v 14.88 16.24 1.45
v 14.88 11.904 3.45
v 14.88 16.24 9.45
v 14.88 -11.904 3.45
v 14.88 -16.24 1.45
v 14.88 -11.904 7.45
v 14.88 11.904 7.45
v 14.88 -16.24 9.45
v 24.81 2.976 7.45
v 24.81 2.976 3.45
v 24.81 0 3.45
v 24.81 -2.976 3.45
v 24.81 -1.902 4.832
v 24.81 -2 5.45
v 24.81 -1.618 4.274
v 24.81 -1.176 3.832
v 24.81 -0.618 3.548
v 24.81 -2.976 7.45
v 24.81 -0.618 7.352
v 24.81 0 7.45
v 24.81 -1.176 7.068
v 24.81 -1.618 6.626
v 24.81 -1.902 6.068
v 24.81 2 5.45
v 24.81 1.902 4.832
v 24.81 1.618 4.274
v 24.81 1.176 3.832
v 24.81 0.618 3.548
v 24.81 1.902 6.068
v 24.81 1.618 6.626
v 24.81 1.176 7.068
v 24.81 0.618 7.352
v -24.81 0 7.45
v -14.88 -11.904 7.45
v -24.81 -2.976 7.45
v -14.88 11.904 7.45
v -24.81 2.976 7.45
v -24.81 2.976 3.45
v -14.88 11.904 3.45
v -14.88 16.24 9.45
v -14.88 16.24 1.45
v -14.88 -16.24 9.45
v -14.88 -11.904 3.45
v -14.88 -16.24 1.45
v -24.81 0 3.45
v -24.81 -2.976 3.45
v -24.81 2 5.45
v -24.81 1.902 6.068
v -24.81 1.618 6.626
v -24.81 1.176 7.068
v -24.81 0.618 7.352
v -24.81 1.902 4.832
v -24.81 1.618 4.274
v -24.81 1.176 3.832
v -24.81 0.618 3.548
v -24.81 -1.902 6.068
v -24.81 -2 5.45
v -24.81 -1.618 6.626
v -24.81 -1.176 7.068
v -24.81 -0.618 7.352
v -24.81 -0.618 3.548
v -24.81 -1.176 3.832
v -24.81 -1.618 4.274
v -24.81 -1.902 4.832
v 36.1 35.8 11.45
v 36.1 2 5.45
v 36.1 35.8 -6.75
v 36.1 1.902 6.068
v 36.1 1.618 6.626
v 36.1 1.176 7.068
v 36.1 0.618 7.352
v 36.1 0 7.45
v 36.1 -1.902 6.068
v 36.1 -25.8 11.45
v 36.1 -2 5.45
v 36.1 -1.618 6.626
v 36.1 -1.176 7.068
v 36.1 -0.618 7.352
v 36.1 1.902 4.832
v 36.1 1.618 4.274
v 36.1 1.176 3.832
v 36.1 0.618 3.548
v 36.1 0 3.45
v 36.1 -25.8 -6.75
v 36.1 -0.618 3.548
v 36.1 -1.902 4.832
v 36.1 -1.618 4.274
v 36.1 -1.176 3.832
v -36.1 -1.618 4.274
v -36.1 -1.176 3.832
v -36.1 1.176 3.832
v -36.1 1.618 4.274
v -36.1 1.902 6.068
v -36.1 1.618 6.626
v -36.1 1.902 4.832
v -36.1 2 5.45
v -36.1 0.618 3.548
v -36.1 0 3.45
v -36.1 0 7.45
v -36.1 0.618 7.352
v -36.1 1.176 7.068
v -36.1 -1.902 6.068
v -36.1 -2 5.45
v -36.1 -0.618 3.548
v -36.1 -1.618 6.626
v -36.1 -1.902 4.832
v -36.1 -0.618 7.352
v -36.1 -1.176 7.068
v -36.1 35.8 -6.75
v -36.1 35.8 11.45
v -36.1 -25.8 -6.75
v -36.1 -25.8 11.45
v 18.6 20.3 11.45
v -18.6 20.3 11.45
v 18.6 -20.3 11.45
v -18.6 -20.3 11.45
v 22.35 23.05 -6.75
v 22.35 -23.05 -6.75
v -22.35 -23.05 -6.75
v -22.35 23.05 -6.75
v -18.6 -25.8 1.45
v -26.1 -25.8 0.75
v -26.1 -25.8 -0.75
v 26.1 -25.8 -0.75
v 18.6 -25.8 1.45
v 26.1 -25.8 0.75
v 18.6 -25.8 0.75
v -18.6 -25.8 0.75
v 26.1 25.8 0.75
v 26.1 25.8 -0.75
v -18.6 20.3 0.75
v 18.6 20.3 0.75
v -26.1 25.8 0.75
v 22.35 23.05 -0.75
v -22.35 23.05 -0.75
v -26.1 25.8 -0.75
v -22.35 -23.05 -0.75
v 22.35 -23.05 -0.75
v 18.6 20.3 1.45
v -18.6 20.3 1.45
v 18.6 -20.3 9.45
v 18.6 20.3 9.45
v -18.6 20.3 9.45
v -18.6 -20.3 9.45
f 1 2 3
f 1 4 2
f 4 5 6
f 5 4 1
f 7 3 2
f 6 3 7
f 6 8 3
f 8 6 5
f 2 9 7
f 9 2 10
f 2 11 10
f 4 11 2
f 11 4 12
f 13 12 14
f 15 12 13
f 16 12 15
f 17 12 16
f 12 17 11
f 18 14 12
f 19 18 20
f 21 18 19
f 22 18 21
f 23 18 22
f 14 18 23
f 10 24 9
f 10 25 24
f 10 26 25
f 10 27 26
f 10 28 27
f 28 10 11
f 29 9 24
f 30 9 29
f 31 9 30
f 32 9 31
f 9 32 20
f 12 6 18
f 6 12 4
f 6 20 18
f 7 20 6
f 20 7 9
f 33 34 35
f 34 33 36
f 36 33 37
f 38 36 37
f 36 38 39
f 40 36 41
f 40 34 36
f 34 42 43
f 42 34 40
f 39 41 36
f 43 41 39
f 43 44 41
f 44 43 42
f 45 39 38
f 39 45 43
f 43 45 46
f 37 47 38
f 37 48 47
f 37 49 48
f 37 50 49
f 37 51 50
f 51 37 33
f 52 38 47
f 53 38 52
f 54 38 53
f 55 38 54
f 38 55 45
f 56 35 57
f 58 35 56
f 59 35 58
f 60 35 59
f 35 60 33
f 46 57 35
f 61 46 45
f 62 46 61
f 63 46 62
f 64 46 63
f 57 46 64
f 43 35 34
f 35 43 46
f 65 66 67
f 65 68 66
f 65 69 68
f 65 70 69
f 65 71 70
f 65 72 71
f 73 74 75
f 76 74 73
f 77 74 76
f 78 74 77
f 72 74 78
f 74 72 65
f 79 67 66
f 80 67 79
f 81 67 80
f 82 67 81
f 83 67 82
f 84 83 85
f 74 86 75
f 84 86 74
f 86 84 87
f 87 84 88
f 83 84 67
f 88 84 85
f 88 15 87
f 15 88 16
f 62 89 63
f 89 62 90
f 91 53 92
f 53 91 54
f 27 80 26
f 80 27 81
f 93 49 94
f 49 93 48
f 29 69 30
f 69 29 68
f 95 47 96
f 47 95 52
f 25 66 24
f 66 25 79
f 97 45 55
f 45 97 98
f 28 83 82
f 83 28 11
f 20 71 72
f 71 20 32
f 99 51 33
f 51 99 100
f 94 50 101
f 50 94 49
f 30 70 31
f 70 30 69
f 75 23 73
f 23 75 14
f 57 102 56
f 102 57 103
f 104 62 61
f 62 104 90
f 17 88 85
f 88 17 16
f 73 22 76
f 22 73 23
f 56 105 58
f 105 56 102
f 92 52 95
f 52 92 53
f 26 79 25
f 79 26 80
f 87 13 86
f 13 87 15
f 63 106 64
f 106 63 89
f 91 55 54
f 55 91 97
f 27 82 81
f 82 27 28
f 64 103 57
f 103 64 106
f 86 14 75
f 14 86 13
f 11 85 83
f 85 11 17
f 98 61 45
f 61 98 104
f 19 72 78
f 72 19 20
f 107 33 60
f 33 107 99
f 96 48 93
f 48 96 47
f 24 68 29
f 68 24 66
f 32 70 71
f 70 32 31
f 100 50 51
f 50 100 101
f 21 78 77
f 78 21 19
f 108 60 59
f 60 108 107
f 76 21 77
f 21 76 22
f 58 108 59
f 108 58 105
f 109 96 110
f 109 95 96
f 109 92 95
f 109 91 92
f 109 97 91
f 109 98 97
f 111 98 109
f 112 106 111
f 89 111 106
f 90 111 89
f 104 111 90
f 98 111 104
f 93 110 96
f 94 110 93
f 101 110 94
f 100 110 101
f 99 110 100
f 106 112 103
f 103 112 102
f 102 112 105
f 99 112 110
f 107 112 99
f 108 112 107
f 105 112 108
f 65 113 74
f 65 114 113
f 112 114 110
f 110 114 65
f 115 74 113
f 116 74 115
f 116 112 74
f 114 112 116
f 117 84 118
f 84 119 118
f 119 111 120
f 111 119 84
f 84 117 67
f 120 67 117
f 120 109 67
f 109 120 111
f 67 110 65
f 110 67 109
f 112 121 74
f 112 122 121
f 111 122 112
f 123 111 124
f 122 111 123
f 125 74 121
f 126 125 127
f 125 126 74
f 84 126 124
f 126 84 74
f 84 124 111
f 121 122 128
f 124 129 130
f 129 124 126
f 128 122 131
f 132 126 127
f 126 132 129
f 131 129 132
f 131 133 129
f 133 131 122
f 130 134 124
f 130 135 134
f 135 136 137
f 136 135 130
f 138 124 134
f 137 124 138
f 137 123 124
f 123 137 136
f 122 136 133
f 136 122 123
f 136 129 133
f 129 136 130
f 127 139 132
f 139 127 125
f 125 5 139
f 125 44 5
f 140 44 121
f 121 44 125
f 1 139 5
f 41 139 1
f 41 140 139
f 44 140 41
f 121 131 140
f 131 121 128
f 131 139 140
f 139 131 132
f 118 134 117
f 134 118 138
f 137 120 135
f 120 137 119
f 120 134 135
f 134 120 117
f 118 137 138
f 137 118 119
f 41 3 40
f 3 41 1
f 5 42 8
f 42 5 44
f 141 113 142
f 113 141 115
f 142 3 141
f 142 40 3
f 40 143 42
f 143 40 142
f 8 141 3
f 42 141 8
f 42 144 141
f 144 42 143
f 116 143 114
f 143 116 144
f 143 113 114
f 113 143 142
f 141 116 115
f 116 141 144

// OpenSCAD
cdXtol = 1.2; //ceramic dimension X tolerance
cdYtol = 0.6; //ceramic dimension Y tolerance
cdZtol = 0.3; //ceramic dimension Z tolerance
cdX = 51+cdXtol; //ceramic dimension X
cdY = 51+cdYtol; //ceramic dimension Y
cdZ = 1.2+cdZtol; //ceramic dimension Z

ndXtol = 1.2; //net base dimension X tolerance
ndYtol = 0.6; //net base dimension Y tolerance
ndZtol = 0.3; //net base dimension Z tolerance
ndX = 36+ndXtol; //net base dimension X
ndY = 40+ndYtol; //net base dimension Y
ndZ = 0.4+ndZtol; //net base dimension Z

gdXtol = 0;// ground dimension Z tolerance
gdZ = 6+gdXtol; //ground dimension Z

uct = 10; //upper chamber thickness
sct = 10; //side chamber thickness

pdZ = 2; //plexi dimension Z

module ceramic() {
    color("Gainsboro") cube([cdX,cdY,cdZ], center=true); 
}

module netbase() {
    translate([0,0,cdZ/2+ndZ/2])
    color("SandyBrown") cube([ndX,ndY,ndZ], center=true); 
}

module gnd() {
    translate([0,0,-cdZ/2-gdZ/2])
    color("DarkKhaki") cube([(cdX+ndX)/2,(cdY+ndY)/2,gdZ], center=true);     
}

module visible() {
    translate([0,0,cdZ/2+ndZ+uct/2])
    color("Red") cube([ndX*0.8,ndY*0.8,uct], center=true); 
}

module plexi() {
    translate([0,0,cdZ/2+ndZ+uct-pdZ/2])
    color("Red") cube([ndX,ndY,pdZ], center=true); 
}
module box() {
    translate([0,sct/2,-cdZ/2-gdZ+(cdZ+ndZ+gdZ+uct)/2])
    color("Green") cube([cdX+2*sct,cdY+sct,cdZ+ndZ+gdZ+uct], center=true); 
}

module prism(l, w, h){
       rotate([90,0,90])translate([-l/2,-w/2,-h/2]) polyhedron(
               points=[[0,0,0], [l,0,0], [l,w,0], [0,w,0], [3*l/8,0,h], [5*l/8,0,h],
    [5*l/8,w,h], [3*l/8,w,h]],
               faces=[[0,1,2,3], [4,7,6,5], [0,3,7,4], [2,6,7,3], [1,5,6,2], [0,4,5,1]] 
               );
}

module prismCut() {    
    union(){
        translate([(cdX+2*sct-ndY*0.8)/8+ndX*0.4,0,cdZ/2+ndZ+(uct-pdZ)/2])
        prism(ndX*0.64,(uct-pdZ)/2,(cdX+2*sct-ndY*0.8)/4);
        
        mirror([1,0,0])
        translate([(cdX+2*sct-ndY*0.8)/8+ndX*0.4,0,cdZ/2+ndZ+(uct-pdZ)/2])
        prism(ndX*0.64,(uct-pdZ)/2,(cdX+2*sct-ndY*0.8)/4);
        
        translate([0,0,cdZ/2+ndZ+(uct-pdZ)/2])
        rotate([0,90,0])
        cylinder(  cdX+2*sct, d=(uct-pdZ)/2, center=true, $fn=20);
        }
    
}

module holes() {
    translate([0,ndY*0.8/4,cdZ/2+ndZ+(uct-pdZ)/2])
    rotate([0,90,0])
    cylinder(  cdX+2*sct, d=(uct-pdZ)/2, center=true, $fn=20);
    
    translate([0,0,cdZ/2+ndZ+(uct-pdZ)/2])
    rotate([0,90,0])
    cylinder(  cdX+2*sct, d=(uct-pdZ)/2, center=true, $fn=20);
    
    translate([0,-ndY*0.8/4,cdZ/2+ndZ+(uct-pdZ)/2])
    rotate([0,90,0])
    cylinder(  cdX+2*sct, d=(uct-pdZ)/2, center=true, $fn=20);
    
}
module frame() {
    difference(){
        box();
        ceramic();        
        netbase();
        translate([0,-ndY/2,0]) netbase();
        gnd();
        visible();
        plexi();
        //uncomment one of those
        prismCut();
        //holes();        
        }    
    }

frame();
    

//ceramic();
//netbase();
//gnd();
//visible();
//box();
